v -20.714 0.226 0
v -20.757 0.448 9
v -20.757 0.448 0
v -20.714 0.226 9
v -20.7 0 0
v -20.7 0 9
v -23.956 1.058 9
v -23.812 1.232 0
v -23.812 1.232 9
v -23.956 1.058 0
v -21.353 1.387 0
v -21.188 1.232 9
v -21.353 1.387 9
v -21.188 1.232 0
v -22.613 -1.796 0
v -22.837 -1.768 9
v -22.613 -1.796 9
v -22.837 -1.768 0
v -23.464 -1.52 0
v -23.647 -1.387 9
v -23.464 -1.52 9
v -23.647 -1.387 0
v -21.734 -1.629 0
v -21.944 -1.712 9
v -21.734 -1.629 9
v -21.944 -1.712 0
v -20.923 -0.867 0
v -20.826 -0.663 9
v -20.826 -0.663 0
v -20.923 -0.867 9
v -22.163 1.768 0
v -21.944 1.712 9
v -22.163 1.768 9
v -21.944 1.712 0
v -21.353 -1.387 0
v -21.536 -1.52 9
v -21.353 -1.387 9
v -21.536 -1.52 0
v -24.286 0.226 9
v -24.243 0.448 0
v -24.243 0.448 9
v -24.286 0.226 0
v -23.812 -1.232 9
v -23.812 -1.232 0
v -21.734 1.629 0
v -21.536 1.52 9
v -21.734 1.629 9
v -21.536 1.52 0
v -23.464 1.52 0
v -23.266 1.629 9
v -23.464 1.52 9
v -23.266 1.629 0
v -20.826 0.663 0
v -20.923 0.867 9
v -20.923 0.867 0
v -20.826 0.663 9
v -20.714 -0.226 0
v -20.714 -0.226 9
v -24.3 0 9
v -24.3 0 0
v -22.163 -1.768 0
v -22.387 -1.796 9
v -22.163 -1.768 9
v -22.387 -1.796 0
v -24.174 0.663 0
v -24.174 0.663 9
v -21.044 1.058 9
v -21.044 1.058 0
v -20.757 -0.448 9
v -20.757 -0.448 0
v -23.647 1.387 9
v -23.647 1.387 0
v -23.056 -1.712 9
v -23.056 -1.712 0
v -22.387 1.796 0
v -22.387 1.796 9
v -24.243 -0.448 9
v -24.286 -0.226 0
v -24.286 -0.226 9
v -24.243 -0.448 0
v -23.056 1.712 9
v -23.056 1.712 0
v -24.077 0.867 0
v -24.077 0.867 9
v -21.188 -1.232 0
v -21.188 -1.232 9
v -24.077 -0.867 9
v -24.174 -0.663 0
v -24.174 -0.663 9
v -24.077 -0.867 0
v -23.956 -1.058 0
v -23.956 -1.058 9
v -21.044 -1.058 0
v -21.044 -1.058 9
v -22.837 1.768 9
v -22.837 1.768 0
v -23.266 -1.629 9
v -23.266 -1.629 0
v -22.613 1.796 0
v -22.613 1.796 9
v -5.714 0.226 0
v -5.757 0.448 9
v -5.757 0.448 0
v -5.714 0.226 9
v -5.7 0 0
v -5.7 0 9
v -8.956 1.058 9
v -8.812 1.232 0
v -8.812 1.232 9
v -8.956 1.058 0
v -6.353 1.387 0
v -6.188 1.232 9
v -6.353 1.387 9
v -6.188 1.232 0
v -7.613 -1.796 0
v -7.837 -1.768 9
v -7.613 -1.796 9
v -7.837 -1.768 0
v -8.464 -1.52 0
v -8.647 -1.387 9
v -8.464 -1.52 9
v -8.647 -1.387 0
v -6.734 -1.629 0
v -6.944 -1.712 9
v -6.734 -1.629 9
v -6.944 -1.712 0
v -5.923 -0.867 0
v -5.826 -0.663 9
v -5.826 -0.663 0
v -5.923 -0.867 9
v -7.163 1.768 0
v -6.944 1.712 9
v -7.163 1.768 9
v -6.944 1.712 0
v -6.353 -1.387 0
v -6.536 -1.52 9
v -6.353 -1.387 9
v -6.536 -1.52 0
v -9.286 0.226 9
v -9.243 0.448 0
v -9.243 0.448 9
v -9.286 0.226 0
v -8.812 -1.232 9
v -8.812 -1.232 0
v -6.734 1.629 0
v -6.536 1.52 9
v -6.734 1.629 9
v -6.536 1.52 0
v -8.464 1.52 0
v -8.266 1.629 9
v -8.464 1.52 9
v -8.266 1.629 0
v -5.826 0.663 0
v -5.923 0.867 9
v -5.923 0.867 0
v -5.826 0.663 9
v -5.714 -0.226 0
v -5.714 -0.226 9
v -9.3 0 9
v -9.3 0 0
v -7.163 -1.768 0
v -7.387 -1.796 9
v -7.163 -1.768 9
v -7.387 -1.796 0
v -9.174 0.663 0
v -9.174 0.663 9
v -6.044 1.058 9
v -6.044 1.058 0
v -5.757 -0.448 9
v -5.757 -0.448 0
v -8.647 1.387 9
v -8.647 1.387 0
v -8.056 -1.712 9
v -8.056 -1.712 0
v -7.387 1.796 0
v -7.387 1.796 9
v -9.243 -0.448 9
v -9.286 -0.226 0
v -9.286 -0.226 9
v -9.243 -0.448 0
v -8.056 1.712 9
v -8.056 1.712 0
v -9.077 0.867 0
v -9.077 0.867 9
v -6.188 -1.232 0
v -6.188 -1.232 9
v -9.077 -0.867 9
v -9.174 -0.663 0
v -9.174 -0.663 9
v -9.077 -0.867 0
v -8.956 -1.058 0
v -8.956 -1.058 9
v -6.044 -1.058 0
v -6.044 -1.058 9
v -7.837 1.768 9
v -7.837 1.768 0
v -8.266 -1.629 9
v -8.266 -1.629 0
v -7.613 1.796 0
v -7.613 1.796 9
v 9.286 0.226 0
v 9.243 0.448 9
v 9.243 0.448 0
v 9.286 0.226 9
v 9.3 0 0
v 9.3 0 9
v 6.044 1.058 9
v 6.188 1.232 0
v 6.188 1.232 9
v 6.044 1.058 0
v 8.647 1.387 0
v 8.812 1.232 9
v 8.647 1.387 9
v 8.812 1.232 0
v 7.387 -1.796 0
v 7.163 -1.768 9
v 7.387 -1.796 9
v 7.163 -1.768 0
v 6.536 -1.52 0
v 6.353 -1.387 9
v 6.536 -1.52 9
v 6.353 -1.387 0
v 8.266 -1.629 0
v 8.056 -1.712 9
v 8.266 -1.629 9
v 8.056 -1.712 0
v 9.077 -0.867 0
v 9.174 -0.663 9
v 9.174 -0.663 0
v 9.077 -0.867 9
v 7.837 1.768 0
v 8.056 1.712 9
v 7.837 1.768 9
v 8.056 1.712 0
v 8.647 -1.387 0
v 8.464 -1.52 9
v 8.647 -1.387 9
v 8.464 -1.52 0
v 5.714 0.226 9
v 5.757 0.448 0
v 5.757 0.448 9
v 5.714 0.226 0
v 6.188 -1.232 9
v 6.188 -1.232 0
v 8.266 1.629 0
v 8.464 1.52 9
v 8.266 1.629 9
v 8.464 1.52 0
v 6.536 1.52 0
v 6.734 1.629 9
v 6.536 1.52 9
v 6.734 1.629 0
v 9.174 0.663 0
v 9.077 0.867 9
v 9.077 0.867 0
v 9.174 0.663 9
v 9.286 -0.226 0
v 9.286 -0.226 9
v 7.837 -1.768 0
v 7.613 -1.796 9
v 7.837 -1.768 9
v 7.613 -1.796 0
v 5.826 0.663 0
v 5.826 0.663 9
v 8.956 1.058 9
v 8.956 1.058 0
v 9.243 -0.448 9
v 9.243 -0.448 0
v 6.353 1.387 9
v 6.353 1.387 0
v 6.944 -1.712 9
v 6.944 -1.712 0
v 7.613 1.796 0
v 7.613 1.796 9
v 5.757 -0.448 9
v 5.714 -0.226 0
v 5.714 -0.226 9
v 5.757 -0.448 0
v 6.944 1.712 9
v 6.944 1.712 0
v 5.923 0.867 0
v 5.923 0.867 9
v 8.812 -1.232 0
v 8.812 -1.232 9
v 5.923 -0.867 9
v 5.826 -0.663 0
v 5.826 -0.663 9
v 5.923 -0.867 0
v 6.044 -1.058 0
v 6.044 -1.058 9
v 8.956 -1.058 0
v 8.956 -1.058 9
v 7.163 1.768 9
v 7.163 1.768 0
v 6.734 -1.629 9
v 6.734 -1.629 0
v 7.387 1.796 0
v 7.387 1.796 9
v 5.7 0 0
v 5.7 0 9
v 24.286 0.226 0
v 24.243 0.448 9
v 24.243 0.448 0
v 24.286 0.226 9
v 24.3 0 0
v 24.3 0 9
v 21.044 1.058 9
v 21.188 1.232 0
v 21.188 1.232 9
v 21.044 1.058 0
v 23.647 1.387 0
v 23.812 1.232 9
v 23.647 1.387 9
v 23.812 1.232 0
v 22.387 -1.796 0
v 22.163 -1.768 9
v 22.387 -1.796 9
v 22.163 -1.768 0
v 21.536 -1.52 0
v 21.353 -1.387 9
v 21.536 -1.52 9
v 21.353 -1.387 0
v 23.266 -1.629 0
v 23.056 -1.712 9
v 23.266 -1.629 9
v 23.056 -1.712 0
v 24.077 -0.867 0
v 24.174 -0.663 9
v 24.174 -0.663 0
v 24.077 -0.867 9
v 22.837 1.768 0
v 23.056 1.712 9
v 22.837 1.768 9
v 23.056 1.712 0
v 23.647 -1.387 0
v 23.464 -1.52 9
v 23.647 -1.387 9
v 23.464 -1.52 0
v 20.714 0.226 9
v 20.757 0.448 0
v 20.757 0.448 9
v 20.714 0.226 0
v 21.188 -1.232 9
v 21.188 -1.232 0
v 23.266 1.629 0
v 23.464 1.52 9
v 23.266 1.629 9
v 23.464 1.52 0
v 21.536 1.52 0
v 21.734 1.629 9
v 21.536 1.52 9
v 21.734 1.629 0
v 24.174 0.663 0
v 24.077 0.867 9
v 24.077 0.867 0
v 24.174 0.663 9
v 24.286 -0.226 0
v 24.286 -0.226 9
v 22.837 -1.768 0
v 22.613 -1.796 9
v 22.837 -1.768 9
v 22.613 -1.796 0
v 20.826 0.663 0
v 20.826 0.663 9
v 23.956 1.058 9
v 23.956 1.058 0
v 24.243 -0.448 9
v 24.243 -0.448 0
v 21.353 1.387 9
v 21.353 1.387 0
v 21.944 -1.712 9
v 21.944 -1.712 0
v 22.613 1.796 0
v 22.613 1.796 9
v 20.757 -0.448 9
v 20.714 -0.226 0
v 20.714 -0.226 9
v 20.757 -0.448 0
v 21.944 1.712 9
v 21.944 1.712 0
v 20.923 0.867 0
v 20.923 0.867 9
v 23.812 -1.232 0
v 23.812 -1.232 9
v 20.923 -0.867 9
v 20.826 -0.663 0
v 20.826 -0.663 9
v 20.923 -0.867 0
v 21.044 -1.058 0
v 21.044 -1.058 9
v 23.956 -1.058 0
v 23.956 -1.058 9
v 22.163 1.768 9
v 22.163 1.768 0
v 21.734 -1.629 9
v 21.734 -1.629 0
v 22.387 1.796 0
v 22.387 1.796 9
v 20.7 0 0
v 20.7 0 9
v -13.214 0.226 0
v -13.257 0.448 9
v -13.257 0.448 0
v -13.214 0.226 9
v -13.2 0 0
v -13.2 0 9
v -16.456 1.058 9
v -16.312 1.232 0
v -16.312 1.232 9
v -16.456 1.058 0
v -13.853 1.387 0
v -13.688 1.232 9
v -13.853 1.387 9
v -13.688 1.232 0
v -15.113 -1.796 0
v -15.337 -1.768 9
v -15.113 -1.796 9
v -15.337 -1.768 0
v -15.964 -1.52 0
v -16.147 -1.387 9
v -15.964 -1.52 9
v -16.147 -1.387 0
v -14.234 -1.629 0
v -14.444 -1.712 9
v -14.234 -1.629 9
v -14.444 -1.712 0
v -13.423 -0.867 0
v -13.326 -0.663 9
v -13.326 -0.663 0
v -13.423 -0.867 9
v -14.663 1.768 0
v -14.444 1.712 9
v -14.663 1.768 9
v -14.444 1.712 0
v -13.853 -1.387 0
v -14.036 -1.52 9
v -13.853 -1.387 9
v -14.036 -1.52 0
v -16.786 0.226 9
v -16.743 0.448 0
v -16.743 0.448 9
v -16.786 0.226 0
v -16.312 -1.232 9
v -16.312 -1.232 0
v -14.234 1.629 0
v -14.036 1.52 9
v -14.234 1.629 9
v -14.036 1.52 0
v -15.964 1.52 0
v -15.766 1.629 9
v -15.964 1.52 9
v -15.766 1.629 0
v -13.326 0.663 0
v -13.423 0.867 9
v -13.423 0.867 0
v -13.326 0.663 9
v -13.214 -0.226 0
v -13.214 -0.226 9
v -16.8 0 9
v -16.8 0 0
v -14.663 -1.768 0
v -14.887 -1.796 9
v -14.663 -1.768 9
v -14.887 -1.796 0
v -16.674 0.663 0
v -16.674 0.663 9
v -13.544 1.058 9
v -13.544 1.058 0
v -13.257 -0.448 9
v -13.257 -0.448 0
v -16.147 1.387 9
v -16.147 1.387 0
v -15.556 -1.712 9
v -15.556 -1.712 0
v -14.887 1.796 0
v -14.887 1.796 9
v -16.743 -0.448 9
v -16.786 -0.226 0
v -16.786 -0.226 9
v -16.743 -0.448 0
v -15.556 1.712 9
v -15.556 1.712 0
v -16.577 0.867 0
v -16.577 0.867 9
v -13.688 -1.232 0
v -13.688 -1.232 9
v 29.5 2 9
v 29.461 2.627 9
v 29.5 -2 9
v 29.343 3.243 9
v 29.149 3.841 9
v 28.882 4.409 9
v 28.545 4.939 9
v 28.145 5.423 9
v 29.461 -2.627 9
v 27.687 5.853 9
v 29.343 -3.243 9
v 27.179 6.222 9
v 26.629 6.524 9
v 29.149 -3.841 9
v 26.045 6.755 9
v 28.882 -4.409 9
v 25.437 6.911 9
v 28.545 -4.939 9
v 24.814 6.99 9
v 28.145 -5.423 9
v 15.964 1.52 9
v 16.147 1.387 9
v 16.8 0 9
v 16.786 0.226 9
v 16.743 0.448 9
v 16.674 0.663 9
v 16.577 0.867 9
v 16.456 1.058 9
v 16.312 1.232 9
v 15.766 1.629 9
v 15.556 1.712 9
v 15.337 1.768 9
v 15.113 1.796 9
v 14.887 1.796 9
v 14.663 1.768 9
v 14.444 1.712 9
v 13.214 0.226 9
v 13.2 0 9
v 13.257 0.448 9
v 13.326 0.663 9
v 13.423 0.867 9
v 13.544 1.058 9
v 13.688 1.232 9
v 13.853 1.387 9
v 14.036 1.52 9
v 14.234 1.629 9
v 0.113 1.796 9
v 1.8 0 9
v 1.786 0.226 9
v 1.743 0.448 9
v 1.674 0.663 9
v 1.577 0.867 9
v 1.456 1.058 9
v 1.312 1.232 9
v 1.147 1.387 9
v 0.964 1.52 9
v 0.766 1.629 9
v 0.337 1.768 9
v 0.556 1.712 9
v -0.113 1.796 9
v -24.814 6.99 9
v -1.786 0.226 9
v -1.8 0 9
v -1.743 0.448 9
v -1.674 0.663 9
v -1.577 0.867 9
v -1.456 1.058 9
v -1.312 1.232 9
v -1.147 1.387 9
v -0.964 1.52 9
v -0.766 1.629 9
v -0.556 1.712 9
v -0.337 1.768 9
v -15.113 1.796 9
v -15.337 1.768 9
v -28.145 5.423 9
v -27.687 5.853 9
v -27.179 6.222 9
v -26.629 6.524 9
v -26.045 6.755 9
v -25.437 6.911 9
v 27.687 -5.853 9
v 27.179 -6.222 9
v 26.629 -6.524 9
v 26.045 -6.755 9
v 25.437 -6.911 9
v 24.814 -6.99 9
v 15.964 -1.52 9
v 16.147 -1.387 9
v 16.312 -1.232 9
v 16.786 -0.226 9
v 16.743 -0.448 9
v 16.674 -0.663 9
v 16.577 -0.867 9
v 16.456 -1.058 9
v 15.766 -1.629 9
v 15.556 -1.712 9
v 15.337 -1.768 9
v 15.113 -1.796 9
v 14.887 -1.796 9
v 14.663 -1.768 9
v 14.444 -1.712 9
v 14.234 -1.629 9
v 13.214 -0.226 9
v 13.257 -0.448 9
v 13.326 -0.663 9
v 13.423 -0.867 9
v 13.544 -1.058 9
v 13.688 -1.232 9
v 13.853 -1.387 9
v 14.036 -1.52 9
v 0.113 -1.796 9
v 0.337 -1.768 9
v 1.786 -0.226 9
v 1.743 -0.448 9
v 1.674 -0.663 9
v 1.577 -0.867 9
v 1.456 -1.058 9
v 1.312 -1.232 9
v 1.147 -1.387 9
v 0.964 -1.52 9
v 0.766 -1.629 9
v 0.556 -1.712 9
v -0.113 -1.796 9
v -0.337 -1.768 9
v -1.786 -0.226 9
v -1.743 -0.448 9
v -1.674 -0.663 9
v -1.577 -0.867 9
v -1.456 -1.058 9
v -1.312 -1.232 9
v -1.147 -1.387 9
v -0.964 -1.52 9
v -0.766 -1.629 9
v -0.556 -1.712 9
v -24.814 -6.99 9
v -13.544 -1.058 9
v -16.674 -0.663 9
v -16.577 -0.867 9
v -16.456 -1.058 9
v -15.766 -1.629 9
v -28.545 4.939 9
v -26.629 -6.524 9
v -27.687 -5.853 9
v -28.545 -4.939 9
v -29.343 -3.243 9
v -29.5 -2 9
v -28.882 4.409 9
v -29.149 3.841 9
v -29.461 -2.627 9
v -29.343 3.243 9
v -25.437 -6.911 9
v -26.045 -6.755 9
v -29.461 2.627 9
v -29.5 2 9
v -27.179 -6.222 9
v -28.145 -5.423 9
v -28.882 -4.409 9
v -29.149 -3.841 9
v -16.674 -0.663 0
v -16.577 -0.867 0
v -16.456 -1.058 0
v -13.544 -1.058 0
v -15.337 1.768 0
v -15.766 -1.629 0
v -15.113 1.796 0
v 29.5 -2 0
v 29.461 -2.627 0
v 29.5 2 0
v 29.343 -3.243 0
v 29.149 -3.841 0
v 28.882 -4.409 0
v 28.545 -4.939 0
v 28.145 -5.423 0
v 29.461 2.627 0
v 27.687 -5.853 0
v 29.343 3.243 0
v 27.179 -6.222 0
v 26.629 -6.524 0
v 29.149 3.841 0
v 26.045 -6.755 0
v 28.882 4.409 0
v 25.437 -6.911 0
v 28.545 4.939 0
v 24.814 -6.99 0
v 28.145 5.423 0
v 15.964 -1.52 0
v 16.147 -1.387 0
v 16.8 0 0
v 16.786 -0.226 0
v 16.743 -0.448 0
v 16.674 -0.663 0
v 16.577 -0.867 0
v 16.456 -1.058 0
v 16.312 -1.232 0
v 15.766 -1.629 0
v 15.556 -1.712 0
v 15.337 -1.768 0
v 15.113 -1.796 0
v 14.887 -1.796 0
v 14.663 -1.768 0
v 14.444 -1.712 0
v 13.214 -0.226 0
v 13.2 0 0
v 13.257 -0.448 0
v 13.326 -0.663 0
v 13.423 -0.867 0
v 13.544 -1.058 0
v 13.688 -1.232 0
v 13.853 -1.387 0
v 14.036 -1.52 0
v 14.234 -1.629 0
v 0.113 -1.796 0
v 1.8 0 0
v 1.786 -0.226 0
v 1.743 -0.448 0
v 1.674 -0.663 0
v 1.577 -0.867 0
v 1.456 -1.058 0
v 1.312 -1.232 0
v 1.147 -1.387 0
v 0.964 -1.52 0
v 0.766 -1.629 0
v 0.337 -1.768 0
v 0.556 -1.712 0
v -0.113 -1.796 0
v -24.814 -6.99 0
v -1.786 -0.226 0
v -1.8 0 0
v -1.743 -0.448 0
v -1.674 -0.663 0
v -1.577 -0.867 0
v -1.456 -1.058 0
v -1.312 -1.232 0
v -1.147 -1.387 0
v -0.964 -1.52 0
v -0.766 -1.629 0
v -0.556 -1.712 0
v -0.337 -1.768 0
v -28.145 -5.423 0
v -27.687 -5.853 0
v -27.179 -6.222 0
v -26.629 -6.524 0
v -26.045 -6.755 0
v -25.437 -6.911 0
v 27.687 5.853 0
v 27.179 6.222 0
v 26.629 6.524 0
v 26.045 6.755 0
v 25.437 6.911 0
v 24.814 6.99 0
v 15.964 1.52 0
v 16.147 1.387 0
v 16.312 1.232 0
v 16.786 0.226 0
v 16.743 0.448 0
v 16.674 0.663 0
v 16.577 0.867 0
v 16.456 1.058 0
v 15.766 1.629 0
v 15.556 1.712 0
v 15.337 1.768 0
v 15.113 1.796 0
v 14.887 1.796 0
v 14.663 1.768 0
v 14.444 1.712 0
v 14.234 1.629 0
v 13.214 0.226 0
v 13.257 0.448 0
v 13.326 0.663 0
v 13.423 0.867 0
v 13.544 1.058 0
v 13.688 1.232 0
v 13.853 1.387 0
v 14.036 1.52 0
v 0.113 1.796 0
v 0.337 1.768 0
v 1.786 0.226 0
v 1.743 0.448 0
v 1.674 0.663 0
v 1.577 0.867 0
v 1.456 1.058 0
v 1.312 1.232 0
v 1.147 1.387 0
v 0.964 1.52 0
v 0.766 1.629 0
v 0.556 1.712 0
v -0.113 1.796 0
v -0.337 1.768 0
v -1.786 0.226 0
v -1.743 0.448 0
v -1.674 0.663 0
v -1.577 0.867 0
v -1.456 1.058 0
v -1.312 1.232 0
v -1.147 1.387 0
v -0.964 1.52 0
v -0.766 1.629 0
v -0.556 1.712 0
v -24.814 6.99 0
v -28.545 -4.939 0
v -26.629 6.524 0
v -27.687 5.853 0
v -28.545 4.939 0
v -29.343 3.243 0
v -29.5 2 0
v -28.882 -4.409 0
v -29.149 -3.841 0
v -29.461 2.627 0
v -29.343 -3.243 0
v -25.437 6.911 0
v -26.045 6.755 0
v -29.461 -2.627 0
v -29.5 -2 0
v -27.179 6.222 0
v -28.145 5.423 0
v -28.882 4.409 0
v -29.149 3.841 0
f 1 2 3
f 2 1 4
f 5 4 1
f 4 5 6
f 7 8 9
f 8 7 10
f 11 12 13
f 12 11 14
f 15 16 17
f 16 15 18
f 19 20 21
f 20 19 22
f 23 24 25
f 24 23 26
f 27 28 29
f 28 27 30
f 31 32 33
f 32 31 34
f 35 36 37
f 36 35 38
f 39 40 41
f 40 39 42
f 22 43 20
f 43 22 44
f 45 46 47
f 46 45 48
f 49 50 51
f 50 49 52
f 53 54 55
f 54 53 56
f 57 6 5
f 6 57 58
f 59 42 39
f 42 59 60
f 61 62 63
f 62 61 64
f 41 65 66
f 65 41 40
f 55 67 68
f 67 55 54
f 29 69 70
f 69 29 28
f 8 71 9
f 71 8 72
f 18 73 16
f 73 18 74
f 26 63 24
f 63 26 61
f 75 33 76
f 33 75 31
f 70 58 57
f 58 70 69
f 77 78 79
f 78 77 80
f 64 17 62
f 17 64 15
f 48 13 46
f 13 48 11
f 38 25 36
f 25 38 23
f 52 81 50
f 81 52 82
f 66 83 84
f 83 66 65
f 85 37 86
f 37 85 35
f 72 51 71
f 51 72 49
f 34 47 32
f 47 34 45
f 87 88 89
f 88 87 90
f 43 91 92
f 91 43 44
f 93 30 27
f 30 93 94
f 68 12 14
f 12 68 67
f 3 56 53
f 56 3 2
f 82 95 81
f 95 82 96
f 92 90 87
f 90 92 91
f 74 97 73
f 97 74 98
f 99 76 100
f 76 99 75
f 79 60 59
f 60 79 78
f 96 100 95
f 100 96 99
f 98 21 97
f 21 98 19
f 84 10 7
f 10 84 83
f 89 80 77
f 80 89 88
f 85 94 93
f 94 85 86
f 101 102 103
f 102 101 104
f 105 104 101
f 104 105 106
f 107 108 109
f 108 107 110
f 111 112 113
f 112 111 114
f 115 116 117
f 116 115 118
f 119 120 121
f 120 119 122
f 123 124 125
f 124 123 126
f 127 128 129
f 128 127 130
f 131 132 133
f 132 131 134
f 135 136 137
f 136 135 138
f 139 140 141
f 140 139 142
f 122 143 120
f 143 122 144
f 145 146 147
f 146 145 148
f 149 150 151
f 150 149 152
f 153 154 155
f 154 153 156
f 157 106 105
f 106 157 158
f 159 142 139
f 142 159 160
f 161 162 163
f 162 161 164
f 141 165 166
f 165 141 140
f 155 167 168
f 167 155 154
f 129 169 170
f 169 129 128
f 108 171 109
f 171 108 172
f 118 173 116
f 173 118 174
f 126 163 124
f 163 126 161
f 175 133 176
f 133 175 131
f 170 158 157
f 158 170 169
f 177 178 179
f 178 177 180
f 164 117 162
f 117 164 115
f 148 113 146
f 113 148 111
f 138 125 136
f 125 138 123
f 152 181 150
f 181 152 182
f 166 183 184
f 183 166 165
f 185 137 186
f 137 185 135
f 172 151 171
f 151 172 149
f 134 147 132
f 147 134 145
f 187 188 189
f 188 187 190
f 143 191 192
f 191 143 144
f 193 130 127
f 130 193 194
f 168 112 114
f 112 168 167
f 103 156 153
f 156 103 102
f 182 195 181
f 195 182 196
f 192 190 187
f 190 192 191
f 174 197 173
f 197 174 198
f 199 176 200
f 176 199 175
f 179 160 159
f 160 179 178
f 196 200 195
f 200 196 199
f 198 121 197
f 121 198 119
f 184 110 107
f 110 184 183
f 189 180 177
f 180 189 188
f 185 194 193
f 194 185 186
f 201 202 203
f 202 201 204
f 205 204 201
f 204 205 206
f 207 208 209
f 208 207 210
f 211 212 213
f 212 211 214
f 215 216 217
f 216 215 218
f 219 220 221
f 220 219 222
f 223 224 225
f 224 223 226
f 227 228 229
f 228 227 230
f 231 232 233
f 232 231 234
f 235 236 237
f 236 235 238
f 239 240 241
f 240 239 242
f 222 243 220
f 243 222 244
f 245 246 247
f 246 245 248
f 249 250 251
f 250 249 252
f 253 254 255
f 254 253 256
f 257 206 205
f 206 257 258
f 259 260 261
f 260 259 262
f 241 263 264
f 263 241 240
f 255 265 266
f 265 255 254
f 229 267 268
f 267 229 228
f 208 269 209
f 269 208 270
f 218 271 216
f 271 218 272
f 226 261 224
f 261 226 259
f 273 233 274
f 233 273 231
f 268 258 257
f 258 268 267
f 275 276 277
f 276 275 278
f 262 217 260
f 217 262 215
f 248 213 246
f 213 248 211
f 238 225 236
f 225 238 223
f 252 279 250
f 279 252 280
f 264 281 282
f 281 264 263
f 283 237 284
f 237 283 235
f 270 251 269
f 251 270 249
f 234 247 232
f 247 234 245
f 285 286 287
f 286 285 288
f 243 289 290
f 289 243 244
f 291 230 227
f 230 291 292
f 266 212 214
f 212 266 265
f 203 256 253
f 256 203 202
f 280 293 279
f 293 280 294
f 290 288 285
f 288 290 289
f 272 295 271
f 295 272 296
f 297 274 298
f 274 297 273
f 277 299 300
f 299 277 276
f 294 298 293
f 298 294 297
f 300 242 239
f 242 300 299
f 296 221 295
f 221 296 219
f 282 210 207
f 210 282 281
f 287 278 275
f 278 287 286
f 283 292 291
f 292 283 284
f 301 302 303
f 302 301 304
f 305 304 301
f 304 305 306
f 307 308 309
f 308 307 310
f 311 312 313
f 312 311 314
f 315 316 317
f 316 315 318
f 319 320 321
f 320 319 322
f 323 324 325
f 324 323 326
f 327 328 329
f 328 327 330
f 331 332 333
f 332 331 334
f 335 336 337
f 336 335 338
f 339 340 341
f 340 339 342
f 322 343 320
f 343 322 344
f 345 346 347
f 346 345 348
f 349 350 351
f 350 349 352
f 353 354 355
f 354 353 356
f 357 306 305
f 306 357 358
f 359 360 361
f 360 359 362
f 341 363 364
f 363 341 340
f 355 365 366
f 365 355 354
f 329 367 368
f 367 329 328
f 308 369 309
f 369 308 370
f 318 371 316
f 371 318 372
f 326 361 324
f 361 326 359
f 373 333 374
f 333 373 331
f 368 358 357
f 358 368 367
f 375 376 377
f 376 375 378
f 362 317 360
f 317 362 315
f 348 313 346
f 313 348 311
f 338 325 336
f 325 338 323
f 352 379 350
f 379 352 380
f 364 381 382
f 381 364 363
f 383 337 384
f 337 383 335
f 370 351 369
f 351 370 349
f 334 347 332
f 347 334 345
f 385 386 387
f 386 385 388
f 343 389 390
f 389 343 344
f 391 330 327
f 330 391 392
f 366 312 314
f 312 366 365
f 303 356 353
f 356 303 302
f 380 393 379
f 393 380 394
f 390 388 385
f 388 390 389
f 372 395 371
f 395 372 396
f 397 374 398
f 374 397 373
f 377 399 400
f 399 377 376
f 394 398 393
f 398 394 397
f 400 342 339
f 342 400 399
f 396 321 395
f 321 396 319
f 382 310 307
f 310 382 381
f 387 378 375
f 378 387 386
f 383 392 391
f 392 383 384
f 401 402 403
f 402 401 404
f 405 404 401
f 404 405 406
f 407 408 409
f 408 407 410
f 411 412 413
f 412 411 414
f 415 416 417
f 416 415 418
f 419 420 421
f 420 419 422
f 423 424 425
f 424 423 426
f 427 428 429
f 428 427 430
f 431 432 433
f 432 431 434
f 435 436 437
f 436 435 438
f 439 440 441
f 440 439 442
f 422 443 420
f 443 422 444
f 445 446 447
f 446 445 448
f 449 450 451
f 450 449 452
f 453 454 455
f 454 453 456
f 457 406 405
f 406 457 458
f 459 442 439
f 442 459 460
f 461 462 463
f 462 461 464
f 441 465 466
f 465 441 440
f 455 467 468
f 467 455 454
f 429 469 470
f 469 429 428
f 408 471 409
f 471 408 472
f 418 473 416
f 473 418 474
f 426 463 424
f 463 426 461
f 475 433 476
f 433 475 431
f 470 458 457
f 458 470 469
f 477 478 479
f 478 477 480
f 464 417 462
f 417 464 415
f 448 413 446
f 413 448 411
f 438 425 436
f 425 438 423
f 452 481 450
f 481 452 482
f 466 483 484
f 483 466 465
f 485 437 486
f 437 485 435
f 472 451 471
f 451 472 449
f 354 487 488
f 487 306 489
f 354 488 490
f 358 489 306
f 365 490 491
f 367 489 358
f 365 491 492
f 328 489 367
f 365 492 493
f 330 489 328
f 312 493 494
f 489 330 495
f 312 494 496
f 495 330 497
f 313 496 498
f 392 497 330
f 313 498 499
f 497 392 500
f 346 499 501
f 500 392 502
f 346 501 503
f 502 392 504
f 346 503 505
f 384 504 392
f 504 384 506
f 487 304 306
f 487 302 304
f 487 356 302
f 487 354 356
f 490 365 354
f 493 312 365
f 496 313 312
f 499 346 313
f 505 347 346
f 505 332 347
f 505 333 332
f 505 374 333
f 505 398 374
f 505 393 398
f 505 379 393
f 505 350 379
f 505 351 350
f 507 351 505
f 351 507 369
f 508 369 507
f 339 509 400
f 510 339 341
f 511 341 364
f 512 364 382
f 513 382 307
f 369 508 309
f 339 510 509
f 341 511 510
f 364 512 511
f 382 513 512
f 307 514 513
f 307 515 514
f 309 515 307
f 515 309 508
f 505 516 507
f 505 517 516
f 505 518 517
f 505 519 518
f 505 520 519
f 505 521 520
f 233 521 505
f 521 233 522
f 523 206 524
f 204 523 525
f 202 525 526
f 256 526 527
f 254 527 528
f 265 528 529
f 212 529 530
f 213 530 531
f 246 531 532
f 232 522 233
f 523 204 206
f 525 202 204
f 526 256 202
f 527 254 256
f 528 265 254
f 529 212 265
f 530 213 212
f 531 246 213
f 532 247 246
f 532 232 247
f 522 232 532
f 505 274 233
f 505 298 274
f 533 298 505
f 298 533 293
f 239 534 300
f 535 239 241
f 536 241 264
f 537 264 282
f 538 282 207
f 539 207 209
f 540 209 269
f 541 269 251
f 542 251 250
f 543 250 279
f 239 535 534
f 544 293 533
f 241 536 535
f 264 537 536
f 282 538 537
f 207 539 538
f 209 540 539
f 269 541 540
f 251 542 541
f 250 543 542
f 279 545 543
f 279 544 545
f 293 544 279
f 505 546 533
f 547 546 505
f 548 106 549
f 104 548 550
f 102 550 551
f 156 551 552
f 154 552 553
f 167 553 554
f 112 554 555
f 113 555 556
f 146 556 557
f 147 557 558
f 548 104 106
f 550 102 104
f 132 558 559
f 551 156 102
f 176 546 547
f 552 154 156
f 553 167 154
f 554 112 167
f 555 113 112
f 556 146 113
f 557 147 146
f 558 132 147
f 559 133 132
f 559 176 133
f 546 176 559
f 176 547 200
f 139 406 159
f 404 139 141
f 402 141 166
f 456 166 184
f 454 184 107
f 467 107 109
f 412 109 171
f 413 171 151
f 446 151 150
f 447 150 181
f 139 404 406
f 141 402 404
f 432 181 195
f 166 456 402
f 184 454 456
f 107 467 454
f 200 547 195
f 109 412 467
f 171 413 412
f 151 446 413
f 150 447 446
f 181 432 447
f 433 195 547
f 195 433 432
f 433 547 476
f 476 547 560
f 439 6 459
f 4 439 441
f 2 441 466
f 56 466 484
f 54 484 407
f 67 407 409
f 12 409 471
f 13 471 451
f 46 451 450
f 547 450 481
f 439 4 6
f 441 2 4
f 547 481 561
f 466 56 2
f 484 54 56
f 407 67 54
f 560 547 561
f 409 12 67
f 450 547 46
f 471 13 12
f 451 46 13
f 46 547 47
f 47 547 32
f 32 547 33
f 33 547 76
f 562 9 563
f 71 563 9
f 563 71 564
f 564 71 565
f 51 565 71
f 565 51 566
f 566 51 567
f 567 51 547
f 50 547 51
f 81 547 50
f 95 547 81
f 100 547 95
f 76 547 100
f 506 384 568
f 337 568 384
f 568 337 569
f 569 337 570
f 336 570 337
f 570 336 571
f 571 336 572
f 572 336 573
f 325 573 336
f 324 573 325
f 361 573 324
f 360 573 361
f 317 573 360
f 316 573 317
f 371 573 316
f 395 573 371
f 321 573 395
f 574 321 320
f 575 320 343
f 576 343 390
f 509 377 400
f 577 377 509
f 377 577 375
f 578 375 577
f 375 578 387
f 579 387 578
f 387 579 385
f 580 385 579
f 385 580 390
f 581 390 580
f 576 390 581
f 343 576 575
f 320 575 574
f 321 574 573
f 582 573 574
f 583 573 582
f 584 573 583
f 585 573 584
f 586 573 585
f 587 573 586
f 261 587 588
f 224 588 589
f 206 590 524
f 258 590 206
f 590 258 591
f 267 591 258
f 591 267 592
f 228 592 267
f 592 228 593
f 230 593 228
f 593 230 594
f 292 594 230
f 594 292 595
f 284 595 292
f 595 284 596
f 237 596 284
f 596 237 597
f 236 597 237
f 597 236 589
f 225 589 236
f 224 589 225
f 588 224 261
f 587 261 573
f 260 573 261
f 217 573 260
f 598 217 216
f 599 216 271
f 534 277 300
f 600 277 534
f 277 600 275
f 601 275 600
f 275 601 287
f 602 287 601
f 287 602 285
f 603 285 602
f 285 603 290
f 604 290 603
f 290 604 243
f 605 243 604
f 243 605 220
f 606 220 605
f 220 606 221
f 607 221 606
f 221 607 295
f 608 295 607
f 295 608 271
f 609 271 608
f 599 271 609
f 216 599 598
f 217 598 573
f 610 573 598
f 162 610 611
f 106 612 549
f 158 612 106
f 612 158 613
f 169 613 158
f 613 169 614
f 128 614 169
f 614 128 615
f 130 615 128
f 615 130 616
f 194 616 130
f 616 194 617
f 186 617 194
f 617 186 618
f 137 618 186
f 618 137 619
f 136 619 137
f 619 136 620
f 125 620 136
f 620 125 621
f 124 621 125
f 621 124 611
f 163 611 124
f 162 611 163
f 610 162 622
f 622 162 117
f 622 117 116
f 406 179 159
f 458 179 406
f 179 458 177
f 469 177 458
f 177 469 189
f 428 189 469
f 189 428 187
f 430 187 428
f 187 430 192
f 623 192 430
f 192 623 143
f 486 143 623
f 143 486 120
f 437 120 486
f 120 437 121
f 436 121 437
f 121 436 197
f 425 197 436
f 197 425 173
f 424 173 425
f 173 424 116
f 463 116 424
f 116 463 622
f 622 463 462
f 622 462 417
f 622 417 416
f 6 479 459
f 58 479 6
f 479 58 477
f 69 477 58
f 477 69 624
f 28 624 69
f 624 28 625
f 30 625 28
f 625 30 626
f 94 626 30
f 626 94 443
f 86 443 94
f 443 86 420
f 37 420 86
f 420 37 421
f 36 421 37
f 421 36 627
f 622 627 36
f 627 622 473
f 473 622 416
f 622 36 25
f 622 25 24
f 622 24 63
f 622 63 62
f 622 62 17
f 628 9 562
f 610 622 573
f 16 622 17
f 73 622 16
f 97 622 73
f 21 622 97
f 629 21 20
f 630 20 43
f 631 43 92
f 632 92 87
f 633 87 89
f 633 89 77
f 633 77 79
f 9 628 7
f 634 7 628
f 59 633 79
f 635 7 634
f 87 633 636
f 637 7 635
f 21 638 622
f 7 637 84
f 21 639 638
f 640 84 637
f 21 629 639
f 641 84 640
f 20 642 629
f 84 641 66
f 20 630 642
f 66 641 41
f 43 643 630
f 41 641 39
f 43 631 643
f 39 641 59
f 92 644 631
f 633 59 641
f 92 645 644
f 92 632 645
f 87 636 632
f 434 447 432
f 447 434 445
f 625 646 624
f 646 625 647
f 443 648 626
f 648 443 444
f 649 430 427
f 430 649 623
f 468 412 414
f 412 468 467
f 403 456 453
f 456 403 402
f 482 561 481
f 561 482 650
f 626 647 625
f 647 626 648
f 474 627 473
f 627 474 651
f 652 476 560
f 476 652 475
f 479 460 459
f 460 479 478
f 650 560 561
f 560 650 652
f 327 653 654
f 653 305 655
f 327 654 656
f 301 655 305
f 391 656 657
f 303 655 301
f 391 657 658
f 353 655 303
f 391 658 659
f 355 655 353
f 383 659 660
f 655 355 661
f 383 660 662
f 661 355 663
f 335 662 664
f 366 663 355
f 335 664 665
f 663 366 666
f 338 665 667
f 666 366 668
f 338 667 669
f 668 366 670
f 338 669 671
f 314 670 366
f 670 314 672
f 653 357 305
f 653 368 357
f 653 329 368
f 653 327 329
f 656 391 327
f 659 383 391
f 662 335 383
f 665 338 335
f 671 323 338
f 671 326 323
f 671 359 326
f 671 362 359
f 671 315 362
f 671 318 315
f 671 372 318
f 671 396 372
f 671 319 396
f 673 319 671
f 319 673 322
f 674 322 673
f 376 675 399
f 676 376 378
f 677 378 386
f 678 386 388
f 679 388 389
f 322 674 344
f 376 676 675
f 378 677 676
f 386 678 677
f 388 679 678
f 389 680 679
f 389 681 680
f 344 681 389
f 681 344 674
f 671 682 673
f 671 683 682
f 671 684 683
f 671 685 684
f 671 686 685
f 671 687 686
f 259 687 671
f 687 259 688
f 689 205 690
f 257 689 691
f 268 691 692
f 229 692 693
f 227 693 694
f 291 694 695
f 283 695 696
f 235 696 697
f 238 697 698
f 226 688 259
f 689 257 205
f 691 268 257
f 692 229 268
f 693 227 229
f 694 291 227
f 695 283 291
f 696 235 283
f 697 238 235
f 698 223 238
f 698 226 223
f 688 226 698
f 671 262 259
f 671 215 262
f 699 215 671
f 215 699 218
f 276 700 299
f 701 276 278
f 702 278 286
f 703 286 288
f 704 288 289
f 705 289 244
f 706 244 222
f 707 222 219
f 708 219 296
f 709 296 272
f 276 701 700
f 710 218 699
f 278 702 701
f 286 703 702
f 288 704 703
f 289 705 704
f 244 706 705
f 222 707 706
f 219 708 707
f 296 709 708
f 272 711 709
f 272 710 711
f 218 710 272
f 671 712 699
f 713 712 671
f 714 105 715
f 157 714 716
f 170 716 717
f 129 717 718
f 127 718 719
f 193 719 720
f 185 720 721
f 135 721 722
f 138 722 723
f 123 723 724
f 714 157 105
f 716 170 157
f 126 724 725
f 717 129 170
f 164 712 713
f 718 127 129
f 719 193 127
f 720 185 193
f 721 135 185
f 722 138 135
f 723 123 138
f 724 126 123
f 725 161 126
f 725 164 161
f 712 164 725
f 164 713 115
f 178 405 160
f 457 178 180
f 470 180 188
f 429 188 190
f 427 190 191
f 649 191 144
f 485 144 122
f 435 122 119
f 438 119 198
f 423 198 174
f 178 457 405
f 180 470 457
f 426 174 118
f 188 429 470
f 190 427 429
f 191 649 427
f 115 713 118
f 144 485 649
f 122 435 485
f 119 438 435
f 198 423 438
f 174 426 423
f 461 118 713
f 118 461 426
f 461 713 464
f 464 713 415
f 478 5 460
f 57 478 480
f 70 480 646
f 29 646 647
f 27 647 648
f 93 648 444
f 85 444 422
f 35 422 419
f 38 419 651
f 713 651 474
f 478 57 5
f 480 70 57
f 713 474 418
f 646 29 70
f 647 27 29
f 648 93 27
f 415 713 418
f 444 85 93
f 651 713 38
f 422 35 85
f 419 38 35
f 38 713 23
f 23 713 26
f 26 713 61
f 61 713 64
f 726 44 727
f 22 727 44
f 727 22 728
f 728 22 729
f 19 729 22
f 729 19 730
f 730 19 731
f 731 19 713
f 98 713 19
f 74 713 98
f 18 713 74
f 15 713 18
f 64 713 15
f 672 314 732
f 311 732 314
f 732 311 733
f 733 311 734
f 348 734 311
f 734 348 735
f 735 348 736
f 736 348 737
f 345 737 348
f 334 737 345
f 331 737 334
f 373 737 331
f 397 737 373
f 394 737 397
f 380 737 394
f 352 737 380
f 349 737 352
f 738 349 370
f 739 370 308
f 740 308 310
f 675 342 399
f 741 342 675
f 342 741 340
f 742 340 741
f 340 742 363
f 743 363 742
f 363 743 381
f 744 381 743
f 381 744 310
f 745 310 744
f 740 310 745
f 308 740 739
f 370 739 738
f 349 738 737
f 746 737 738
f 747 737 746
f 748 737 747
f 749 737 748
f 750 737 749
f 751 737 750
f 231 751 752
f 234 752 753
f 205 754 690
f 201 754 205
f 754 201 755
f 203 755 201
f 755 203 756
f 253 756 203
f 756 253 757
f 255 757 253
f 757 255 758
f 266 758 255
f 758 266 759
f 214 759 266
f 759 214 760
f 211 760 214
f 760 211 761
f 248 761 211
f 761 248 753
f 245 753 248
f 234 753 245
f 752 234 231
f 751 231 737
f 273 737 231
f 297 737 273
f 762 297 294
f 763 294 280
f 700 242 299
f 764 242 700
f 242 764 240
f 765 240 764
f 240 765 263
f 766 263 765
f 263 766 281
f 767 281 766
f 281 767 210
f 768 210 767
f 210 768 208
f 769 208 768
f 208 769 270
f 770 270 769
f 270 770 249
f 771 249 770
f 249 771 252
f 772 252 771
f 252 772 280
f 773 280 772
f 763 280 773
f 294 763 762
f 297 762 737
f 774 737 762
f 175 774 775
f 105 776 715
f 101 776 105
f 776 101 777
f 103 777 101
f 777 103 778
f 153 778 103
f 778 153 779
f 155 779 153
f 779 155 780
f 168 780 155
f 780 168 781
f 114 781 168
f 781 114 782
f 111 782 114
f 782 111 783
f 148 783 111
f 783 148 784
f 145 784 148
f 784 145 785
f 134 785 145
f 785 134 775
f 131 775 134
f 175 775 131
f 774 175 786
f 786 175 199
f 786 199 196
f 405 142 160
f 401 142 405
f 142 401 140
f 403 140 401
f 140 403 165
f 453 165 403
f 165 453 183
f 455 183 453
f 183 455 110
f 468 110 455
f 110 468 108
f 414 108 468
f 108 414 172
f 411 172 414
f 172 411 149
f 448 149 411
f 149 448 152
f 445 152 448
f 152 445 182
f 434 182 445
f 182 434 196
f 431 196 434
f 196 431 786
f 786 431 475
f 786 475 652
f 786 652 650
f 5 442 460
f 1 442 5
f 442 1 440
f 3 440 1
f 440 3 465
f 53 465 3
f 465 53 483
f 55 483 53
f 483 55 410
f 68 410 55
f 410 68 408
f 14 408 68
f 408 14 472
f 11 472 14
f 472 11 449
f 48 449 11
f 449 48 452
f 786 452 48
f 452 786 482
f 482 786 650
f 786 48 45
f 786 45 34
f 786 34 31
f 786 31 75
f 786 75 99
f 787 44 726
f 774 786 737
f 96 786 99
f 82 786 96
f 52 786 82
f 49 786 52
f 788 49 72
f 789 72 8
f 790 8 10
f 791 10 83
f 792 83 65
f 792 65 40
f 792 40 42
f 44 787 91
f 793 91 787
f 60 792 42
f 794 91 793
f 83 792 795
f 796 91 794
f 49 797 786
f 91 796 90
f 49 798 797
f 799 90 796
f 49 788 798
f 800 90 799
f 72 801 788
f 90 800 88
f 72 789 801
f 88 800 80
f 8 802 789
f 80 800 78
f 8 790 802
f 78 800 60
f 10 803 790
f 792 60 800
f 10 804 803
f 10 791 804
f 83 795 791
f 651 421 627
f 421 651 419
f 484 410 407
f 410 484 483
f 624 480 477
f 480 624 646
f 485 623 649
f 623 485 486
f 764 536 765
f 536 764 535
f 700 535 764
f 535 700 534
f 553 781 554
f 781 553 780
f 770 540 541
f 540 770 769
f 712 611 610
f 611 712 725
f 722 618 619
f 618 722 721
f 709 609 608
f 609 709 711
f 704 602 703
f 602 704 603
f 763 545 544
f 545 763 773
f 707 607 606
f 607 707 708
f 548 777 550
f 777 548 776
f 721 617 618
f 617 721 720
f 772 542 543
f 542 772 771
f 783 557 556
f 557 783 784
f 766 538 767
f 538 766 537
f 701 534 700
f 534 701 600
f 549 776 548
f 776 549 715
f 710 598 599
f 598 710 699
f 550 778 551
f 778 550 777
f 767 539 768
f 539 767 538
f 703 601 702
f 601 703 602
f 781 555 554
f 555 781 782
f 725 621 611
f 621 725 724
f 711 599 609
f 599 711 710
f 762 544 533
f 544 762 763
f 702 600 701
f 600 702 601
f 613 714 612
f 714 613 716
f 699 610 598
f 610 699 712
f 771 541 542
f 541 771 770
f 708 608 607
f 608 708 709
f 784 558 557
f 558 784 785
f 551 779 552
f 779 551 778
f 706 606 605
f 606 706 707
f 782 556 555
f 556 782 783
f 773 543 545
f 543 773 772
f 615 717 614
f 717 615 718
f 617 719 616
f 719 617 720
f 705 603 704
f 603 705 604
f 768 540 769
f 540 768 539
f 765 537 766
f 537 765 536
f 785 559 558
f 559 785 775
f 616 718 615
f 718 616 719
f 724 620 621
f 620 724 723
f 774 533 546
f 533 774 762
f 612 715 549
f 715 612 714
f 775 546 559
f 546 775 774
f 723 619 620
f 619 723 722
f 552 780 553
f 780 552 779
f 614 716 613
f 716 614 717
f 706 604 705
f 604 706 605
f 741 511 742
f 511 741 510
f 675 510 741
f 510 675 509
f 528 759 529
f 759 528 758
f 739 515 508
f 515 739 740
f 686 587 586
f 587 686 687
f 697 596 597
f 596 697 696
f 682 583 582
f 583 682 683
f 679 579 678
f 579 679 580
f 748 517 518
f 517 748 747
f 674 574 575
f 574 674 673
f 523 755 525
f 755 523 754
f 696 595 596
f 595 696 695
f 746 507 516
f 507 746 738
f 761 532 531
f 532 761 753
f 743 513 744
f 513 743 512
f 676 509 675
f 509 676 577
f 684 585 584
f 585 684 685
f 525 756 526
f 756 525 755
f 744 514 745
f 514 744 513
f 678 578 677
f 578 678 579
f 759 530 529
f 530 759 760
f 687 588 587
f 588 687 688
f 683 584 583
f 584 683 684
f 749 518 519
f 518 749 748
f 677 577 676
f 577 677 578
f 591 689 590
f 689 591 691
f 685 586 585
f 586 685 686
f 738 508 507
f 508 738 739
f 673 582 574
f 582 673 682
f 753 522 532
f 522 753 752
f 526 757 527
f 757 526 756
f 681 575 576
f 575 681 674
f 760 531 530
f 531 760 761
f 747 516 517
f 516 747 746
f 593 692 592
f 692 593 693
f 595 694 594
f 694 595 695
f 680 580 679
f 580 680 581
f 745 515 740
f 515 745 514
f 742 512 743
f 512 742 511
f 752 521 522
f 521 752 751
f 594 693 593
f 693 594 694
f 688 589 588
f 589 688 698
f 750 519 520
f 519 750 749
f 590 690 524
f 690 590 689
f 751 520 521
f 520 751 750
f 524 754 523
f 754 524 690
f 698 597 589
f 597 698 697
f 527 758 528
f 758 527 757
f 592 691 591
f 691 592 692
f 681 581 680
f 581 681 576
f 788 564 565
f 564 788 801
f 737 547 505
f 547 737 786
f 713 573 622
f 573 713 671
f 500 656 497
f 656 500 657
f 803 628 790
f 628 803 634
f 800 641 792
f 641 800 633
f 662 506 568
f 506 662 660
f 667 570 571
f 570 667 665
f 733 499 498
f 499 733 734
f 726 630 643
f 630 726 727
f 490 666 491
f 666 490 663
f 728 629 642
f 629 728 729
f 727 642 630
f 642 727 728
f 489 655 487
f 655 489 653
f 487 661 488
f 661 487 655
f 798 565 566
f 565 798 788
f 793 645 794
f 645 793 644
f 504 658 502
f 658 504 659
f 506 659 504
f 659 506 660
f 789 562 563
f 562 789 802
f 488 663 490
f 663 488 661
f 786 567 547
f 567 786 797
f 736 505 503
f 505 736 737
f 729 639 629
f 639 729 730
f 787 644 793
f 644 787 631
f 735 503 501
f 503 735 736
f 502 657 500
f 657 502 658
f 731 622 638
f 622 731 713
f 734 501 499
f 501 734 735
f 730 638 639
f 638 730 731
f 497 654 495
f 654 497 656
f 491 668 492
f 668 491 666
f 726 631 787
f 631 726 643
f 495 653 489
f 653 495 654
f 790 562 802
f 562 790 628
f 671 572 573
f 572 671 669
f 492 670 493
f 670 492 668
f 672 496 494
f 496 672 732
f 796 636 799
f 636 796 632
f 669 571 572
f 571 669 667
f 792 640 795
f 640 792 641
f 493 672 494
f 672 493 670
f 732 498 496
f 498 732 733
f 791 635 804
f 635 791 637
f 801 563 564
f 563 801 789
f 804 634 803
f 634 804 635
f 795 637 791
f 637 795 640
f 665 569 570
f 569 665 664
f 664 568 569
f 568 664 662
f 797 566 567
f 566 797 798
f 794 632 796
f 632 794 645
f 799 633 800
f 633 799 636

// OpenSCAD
$fn = 50;


difference() {
	union() {
		hull() {
			translate(v = [-24.5000000000, 2.0000000000, 0]) {
				cylinder(h = 9, r = 5);
			}
			translate(v = [24.5000000000, 2.0000000000, 0]) {
				cylinder(h = 9, r = 5);
			}
			translate(v = [-24.5000000000, -2.0000000000, 0]) {
				cylinder(h = 9, r = 5);
			}
			translate(v = [24.5000000000, -2.0000000000, 0]) {
				cylinder(h = 9, r = 5);
			}
		}
	}
	union() {
		translate(v = [-22.5000000000, 0.0000000000, -100.0000000000]) {
			cylinder(h = 200, r = 1.8000000000);
		}
		translate(v = [-7.5000000000, 0.0000000000, -100.0000000000]) {
			cylinder(h = 200, r = 1.8000000000);
		}
		translate(v = [7.5000000000, 0.0000000000, -100.0000000000]) {
			cylinder(h = 200, r = 1.8000000000);
		}
		translate(v = [22.5000000000, 0.0000000000, -100.0000000000]) {
			cylinder(h = 200, r = 1.8000000000);
		}
		translate(v = [-22.5000000000, 0.0000000000, 0]) {
			cylinder(h = 9, r = 1.8000000000);
		}
		translate(v = [-15.0000000000, 0.0000000000, 0]) {
			cylinder(h = 9, r = 1.8000000000);
		}
		translate(v = [-7.5000000000, 0.0000000000, 0]) {
			cylinder(h = 9, r = 1.8000000000);
		}
		cylinder(h = 9, r = 1.8000000000);
		translate(v = [7.5000000000, 0.0000000000, 0]) {
			cylinder(h = 9, r = 1.8000000000);
		}
		translate(v = [15.0000000000, 0.0000000000, 0]) {
			cylinder(h = 9, r = 1.8000000000);
		}
		translate(v = [22.5000000000, 0.0000000000, 0]) {
			cylinder(h = 9, r = 1.8000000000);
		}
		translate(v = [-22.5000000000, 0.0000000000, 0]) {
			cylinder(h = 9, r = 1.8000000000);
		}
		translate(v = [-15.0000000000, 0.0000000000, 0]) {
			cylinder(h = 9, r = 1.8000000000);
		}
		translate(v = [-7.5000000000, 0.0000000000, 0]) {
			cylinder(h = 9, r = 1.8000000000);
		}
		cylinder(h = 9, r = 1.8000000000);
		translate(v = [7.5000000000, 0.0000000000, 0]) {
			cylinder(h = 9, r = 1.8000000000);
		}
		translate(v = [15.0000000000, 0.0000000000, 0]) {
			cylinder(h = 9, r = 1.8000000000);
		}
		translate(v = [22.5000000000, 0.0000000000, 0]) {
			cylinder(h = 9, r = 1.8000000000);
		}
		translate(v = [-22.5000000000, 0.0000000000, 0]) {
			cylinder(h = 9, r = 1.8000000000);
		}
		translate(v = [-15.0000000000, 0.0000000000, 0]) {
			cylinder(h = 9, r = 1.8000000000);
		}
		translate(v = [-7.5000000000, 0.0000000000, 0]) {
			cylinder(h = 9, r = 1.8000000000);
		}
		cylinder(h = 9, r = 1.8000000000);
		translate(v = [7.5000000000, 0.0000000000, 0]) {
			cylinder(h = 9, r = 1.8000000000);
		}
		translate(v = [15.0000000000, 0.0000000000, 0]) {
			cylinder(h = 9, r = 1.8000000000);
		}
		translate(v = [22.5000000000, 0.0000000000, 0]) {
			cylinder(h = 9, r = 1.8000000000);
		}
	}
}
